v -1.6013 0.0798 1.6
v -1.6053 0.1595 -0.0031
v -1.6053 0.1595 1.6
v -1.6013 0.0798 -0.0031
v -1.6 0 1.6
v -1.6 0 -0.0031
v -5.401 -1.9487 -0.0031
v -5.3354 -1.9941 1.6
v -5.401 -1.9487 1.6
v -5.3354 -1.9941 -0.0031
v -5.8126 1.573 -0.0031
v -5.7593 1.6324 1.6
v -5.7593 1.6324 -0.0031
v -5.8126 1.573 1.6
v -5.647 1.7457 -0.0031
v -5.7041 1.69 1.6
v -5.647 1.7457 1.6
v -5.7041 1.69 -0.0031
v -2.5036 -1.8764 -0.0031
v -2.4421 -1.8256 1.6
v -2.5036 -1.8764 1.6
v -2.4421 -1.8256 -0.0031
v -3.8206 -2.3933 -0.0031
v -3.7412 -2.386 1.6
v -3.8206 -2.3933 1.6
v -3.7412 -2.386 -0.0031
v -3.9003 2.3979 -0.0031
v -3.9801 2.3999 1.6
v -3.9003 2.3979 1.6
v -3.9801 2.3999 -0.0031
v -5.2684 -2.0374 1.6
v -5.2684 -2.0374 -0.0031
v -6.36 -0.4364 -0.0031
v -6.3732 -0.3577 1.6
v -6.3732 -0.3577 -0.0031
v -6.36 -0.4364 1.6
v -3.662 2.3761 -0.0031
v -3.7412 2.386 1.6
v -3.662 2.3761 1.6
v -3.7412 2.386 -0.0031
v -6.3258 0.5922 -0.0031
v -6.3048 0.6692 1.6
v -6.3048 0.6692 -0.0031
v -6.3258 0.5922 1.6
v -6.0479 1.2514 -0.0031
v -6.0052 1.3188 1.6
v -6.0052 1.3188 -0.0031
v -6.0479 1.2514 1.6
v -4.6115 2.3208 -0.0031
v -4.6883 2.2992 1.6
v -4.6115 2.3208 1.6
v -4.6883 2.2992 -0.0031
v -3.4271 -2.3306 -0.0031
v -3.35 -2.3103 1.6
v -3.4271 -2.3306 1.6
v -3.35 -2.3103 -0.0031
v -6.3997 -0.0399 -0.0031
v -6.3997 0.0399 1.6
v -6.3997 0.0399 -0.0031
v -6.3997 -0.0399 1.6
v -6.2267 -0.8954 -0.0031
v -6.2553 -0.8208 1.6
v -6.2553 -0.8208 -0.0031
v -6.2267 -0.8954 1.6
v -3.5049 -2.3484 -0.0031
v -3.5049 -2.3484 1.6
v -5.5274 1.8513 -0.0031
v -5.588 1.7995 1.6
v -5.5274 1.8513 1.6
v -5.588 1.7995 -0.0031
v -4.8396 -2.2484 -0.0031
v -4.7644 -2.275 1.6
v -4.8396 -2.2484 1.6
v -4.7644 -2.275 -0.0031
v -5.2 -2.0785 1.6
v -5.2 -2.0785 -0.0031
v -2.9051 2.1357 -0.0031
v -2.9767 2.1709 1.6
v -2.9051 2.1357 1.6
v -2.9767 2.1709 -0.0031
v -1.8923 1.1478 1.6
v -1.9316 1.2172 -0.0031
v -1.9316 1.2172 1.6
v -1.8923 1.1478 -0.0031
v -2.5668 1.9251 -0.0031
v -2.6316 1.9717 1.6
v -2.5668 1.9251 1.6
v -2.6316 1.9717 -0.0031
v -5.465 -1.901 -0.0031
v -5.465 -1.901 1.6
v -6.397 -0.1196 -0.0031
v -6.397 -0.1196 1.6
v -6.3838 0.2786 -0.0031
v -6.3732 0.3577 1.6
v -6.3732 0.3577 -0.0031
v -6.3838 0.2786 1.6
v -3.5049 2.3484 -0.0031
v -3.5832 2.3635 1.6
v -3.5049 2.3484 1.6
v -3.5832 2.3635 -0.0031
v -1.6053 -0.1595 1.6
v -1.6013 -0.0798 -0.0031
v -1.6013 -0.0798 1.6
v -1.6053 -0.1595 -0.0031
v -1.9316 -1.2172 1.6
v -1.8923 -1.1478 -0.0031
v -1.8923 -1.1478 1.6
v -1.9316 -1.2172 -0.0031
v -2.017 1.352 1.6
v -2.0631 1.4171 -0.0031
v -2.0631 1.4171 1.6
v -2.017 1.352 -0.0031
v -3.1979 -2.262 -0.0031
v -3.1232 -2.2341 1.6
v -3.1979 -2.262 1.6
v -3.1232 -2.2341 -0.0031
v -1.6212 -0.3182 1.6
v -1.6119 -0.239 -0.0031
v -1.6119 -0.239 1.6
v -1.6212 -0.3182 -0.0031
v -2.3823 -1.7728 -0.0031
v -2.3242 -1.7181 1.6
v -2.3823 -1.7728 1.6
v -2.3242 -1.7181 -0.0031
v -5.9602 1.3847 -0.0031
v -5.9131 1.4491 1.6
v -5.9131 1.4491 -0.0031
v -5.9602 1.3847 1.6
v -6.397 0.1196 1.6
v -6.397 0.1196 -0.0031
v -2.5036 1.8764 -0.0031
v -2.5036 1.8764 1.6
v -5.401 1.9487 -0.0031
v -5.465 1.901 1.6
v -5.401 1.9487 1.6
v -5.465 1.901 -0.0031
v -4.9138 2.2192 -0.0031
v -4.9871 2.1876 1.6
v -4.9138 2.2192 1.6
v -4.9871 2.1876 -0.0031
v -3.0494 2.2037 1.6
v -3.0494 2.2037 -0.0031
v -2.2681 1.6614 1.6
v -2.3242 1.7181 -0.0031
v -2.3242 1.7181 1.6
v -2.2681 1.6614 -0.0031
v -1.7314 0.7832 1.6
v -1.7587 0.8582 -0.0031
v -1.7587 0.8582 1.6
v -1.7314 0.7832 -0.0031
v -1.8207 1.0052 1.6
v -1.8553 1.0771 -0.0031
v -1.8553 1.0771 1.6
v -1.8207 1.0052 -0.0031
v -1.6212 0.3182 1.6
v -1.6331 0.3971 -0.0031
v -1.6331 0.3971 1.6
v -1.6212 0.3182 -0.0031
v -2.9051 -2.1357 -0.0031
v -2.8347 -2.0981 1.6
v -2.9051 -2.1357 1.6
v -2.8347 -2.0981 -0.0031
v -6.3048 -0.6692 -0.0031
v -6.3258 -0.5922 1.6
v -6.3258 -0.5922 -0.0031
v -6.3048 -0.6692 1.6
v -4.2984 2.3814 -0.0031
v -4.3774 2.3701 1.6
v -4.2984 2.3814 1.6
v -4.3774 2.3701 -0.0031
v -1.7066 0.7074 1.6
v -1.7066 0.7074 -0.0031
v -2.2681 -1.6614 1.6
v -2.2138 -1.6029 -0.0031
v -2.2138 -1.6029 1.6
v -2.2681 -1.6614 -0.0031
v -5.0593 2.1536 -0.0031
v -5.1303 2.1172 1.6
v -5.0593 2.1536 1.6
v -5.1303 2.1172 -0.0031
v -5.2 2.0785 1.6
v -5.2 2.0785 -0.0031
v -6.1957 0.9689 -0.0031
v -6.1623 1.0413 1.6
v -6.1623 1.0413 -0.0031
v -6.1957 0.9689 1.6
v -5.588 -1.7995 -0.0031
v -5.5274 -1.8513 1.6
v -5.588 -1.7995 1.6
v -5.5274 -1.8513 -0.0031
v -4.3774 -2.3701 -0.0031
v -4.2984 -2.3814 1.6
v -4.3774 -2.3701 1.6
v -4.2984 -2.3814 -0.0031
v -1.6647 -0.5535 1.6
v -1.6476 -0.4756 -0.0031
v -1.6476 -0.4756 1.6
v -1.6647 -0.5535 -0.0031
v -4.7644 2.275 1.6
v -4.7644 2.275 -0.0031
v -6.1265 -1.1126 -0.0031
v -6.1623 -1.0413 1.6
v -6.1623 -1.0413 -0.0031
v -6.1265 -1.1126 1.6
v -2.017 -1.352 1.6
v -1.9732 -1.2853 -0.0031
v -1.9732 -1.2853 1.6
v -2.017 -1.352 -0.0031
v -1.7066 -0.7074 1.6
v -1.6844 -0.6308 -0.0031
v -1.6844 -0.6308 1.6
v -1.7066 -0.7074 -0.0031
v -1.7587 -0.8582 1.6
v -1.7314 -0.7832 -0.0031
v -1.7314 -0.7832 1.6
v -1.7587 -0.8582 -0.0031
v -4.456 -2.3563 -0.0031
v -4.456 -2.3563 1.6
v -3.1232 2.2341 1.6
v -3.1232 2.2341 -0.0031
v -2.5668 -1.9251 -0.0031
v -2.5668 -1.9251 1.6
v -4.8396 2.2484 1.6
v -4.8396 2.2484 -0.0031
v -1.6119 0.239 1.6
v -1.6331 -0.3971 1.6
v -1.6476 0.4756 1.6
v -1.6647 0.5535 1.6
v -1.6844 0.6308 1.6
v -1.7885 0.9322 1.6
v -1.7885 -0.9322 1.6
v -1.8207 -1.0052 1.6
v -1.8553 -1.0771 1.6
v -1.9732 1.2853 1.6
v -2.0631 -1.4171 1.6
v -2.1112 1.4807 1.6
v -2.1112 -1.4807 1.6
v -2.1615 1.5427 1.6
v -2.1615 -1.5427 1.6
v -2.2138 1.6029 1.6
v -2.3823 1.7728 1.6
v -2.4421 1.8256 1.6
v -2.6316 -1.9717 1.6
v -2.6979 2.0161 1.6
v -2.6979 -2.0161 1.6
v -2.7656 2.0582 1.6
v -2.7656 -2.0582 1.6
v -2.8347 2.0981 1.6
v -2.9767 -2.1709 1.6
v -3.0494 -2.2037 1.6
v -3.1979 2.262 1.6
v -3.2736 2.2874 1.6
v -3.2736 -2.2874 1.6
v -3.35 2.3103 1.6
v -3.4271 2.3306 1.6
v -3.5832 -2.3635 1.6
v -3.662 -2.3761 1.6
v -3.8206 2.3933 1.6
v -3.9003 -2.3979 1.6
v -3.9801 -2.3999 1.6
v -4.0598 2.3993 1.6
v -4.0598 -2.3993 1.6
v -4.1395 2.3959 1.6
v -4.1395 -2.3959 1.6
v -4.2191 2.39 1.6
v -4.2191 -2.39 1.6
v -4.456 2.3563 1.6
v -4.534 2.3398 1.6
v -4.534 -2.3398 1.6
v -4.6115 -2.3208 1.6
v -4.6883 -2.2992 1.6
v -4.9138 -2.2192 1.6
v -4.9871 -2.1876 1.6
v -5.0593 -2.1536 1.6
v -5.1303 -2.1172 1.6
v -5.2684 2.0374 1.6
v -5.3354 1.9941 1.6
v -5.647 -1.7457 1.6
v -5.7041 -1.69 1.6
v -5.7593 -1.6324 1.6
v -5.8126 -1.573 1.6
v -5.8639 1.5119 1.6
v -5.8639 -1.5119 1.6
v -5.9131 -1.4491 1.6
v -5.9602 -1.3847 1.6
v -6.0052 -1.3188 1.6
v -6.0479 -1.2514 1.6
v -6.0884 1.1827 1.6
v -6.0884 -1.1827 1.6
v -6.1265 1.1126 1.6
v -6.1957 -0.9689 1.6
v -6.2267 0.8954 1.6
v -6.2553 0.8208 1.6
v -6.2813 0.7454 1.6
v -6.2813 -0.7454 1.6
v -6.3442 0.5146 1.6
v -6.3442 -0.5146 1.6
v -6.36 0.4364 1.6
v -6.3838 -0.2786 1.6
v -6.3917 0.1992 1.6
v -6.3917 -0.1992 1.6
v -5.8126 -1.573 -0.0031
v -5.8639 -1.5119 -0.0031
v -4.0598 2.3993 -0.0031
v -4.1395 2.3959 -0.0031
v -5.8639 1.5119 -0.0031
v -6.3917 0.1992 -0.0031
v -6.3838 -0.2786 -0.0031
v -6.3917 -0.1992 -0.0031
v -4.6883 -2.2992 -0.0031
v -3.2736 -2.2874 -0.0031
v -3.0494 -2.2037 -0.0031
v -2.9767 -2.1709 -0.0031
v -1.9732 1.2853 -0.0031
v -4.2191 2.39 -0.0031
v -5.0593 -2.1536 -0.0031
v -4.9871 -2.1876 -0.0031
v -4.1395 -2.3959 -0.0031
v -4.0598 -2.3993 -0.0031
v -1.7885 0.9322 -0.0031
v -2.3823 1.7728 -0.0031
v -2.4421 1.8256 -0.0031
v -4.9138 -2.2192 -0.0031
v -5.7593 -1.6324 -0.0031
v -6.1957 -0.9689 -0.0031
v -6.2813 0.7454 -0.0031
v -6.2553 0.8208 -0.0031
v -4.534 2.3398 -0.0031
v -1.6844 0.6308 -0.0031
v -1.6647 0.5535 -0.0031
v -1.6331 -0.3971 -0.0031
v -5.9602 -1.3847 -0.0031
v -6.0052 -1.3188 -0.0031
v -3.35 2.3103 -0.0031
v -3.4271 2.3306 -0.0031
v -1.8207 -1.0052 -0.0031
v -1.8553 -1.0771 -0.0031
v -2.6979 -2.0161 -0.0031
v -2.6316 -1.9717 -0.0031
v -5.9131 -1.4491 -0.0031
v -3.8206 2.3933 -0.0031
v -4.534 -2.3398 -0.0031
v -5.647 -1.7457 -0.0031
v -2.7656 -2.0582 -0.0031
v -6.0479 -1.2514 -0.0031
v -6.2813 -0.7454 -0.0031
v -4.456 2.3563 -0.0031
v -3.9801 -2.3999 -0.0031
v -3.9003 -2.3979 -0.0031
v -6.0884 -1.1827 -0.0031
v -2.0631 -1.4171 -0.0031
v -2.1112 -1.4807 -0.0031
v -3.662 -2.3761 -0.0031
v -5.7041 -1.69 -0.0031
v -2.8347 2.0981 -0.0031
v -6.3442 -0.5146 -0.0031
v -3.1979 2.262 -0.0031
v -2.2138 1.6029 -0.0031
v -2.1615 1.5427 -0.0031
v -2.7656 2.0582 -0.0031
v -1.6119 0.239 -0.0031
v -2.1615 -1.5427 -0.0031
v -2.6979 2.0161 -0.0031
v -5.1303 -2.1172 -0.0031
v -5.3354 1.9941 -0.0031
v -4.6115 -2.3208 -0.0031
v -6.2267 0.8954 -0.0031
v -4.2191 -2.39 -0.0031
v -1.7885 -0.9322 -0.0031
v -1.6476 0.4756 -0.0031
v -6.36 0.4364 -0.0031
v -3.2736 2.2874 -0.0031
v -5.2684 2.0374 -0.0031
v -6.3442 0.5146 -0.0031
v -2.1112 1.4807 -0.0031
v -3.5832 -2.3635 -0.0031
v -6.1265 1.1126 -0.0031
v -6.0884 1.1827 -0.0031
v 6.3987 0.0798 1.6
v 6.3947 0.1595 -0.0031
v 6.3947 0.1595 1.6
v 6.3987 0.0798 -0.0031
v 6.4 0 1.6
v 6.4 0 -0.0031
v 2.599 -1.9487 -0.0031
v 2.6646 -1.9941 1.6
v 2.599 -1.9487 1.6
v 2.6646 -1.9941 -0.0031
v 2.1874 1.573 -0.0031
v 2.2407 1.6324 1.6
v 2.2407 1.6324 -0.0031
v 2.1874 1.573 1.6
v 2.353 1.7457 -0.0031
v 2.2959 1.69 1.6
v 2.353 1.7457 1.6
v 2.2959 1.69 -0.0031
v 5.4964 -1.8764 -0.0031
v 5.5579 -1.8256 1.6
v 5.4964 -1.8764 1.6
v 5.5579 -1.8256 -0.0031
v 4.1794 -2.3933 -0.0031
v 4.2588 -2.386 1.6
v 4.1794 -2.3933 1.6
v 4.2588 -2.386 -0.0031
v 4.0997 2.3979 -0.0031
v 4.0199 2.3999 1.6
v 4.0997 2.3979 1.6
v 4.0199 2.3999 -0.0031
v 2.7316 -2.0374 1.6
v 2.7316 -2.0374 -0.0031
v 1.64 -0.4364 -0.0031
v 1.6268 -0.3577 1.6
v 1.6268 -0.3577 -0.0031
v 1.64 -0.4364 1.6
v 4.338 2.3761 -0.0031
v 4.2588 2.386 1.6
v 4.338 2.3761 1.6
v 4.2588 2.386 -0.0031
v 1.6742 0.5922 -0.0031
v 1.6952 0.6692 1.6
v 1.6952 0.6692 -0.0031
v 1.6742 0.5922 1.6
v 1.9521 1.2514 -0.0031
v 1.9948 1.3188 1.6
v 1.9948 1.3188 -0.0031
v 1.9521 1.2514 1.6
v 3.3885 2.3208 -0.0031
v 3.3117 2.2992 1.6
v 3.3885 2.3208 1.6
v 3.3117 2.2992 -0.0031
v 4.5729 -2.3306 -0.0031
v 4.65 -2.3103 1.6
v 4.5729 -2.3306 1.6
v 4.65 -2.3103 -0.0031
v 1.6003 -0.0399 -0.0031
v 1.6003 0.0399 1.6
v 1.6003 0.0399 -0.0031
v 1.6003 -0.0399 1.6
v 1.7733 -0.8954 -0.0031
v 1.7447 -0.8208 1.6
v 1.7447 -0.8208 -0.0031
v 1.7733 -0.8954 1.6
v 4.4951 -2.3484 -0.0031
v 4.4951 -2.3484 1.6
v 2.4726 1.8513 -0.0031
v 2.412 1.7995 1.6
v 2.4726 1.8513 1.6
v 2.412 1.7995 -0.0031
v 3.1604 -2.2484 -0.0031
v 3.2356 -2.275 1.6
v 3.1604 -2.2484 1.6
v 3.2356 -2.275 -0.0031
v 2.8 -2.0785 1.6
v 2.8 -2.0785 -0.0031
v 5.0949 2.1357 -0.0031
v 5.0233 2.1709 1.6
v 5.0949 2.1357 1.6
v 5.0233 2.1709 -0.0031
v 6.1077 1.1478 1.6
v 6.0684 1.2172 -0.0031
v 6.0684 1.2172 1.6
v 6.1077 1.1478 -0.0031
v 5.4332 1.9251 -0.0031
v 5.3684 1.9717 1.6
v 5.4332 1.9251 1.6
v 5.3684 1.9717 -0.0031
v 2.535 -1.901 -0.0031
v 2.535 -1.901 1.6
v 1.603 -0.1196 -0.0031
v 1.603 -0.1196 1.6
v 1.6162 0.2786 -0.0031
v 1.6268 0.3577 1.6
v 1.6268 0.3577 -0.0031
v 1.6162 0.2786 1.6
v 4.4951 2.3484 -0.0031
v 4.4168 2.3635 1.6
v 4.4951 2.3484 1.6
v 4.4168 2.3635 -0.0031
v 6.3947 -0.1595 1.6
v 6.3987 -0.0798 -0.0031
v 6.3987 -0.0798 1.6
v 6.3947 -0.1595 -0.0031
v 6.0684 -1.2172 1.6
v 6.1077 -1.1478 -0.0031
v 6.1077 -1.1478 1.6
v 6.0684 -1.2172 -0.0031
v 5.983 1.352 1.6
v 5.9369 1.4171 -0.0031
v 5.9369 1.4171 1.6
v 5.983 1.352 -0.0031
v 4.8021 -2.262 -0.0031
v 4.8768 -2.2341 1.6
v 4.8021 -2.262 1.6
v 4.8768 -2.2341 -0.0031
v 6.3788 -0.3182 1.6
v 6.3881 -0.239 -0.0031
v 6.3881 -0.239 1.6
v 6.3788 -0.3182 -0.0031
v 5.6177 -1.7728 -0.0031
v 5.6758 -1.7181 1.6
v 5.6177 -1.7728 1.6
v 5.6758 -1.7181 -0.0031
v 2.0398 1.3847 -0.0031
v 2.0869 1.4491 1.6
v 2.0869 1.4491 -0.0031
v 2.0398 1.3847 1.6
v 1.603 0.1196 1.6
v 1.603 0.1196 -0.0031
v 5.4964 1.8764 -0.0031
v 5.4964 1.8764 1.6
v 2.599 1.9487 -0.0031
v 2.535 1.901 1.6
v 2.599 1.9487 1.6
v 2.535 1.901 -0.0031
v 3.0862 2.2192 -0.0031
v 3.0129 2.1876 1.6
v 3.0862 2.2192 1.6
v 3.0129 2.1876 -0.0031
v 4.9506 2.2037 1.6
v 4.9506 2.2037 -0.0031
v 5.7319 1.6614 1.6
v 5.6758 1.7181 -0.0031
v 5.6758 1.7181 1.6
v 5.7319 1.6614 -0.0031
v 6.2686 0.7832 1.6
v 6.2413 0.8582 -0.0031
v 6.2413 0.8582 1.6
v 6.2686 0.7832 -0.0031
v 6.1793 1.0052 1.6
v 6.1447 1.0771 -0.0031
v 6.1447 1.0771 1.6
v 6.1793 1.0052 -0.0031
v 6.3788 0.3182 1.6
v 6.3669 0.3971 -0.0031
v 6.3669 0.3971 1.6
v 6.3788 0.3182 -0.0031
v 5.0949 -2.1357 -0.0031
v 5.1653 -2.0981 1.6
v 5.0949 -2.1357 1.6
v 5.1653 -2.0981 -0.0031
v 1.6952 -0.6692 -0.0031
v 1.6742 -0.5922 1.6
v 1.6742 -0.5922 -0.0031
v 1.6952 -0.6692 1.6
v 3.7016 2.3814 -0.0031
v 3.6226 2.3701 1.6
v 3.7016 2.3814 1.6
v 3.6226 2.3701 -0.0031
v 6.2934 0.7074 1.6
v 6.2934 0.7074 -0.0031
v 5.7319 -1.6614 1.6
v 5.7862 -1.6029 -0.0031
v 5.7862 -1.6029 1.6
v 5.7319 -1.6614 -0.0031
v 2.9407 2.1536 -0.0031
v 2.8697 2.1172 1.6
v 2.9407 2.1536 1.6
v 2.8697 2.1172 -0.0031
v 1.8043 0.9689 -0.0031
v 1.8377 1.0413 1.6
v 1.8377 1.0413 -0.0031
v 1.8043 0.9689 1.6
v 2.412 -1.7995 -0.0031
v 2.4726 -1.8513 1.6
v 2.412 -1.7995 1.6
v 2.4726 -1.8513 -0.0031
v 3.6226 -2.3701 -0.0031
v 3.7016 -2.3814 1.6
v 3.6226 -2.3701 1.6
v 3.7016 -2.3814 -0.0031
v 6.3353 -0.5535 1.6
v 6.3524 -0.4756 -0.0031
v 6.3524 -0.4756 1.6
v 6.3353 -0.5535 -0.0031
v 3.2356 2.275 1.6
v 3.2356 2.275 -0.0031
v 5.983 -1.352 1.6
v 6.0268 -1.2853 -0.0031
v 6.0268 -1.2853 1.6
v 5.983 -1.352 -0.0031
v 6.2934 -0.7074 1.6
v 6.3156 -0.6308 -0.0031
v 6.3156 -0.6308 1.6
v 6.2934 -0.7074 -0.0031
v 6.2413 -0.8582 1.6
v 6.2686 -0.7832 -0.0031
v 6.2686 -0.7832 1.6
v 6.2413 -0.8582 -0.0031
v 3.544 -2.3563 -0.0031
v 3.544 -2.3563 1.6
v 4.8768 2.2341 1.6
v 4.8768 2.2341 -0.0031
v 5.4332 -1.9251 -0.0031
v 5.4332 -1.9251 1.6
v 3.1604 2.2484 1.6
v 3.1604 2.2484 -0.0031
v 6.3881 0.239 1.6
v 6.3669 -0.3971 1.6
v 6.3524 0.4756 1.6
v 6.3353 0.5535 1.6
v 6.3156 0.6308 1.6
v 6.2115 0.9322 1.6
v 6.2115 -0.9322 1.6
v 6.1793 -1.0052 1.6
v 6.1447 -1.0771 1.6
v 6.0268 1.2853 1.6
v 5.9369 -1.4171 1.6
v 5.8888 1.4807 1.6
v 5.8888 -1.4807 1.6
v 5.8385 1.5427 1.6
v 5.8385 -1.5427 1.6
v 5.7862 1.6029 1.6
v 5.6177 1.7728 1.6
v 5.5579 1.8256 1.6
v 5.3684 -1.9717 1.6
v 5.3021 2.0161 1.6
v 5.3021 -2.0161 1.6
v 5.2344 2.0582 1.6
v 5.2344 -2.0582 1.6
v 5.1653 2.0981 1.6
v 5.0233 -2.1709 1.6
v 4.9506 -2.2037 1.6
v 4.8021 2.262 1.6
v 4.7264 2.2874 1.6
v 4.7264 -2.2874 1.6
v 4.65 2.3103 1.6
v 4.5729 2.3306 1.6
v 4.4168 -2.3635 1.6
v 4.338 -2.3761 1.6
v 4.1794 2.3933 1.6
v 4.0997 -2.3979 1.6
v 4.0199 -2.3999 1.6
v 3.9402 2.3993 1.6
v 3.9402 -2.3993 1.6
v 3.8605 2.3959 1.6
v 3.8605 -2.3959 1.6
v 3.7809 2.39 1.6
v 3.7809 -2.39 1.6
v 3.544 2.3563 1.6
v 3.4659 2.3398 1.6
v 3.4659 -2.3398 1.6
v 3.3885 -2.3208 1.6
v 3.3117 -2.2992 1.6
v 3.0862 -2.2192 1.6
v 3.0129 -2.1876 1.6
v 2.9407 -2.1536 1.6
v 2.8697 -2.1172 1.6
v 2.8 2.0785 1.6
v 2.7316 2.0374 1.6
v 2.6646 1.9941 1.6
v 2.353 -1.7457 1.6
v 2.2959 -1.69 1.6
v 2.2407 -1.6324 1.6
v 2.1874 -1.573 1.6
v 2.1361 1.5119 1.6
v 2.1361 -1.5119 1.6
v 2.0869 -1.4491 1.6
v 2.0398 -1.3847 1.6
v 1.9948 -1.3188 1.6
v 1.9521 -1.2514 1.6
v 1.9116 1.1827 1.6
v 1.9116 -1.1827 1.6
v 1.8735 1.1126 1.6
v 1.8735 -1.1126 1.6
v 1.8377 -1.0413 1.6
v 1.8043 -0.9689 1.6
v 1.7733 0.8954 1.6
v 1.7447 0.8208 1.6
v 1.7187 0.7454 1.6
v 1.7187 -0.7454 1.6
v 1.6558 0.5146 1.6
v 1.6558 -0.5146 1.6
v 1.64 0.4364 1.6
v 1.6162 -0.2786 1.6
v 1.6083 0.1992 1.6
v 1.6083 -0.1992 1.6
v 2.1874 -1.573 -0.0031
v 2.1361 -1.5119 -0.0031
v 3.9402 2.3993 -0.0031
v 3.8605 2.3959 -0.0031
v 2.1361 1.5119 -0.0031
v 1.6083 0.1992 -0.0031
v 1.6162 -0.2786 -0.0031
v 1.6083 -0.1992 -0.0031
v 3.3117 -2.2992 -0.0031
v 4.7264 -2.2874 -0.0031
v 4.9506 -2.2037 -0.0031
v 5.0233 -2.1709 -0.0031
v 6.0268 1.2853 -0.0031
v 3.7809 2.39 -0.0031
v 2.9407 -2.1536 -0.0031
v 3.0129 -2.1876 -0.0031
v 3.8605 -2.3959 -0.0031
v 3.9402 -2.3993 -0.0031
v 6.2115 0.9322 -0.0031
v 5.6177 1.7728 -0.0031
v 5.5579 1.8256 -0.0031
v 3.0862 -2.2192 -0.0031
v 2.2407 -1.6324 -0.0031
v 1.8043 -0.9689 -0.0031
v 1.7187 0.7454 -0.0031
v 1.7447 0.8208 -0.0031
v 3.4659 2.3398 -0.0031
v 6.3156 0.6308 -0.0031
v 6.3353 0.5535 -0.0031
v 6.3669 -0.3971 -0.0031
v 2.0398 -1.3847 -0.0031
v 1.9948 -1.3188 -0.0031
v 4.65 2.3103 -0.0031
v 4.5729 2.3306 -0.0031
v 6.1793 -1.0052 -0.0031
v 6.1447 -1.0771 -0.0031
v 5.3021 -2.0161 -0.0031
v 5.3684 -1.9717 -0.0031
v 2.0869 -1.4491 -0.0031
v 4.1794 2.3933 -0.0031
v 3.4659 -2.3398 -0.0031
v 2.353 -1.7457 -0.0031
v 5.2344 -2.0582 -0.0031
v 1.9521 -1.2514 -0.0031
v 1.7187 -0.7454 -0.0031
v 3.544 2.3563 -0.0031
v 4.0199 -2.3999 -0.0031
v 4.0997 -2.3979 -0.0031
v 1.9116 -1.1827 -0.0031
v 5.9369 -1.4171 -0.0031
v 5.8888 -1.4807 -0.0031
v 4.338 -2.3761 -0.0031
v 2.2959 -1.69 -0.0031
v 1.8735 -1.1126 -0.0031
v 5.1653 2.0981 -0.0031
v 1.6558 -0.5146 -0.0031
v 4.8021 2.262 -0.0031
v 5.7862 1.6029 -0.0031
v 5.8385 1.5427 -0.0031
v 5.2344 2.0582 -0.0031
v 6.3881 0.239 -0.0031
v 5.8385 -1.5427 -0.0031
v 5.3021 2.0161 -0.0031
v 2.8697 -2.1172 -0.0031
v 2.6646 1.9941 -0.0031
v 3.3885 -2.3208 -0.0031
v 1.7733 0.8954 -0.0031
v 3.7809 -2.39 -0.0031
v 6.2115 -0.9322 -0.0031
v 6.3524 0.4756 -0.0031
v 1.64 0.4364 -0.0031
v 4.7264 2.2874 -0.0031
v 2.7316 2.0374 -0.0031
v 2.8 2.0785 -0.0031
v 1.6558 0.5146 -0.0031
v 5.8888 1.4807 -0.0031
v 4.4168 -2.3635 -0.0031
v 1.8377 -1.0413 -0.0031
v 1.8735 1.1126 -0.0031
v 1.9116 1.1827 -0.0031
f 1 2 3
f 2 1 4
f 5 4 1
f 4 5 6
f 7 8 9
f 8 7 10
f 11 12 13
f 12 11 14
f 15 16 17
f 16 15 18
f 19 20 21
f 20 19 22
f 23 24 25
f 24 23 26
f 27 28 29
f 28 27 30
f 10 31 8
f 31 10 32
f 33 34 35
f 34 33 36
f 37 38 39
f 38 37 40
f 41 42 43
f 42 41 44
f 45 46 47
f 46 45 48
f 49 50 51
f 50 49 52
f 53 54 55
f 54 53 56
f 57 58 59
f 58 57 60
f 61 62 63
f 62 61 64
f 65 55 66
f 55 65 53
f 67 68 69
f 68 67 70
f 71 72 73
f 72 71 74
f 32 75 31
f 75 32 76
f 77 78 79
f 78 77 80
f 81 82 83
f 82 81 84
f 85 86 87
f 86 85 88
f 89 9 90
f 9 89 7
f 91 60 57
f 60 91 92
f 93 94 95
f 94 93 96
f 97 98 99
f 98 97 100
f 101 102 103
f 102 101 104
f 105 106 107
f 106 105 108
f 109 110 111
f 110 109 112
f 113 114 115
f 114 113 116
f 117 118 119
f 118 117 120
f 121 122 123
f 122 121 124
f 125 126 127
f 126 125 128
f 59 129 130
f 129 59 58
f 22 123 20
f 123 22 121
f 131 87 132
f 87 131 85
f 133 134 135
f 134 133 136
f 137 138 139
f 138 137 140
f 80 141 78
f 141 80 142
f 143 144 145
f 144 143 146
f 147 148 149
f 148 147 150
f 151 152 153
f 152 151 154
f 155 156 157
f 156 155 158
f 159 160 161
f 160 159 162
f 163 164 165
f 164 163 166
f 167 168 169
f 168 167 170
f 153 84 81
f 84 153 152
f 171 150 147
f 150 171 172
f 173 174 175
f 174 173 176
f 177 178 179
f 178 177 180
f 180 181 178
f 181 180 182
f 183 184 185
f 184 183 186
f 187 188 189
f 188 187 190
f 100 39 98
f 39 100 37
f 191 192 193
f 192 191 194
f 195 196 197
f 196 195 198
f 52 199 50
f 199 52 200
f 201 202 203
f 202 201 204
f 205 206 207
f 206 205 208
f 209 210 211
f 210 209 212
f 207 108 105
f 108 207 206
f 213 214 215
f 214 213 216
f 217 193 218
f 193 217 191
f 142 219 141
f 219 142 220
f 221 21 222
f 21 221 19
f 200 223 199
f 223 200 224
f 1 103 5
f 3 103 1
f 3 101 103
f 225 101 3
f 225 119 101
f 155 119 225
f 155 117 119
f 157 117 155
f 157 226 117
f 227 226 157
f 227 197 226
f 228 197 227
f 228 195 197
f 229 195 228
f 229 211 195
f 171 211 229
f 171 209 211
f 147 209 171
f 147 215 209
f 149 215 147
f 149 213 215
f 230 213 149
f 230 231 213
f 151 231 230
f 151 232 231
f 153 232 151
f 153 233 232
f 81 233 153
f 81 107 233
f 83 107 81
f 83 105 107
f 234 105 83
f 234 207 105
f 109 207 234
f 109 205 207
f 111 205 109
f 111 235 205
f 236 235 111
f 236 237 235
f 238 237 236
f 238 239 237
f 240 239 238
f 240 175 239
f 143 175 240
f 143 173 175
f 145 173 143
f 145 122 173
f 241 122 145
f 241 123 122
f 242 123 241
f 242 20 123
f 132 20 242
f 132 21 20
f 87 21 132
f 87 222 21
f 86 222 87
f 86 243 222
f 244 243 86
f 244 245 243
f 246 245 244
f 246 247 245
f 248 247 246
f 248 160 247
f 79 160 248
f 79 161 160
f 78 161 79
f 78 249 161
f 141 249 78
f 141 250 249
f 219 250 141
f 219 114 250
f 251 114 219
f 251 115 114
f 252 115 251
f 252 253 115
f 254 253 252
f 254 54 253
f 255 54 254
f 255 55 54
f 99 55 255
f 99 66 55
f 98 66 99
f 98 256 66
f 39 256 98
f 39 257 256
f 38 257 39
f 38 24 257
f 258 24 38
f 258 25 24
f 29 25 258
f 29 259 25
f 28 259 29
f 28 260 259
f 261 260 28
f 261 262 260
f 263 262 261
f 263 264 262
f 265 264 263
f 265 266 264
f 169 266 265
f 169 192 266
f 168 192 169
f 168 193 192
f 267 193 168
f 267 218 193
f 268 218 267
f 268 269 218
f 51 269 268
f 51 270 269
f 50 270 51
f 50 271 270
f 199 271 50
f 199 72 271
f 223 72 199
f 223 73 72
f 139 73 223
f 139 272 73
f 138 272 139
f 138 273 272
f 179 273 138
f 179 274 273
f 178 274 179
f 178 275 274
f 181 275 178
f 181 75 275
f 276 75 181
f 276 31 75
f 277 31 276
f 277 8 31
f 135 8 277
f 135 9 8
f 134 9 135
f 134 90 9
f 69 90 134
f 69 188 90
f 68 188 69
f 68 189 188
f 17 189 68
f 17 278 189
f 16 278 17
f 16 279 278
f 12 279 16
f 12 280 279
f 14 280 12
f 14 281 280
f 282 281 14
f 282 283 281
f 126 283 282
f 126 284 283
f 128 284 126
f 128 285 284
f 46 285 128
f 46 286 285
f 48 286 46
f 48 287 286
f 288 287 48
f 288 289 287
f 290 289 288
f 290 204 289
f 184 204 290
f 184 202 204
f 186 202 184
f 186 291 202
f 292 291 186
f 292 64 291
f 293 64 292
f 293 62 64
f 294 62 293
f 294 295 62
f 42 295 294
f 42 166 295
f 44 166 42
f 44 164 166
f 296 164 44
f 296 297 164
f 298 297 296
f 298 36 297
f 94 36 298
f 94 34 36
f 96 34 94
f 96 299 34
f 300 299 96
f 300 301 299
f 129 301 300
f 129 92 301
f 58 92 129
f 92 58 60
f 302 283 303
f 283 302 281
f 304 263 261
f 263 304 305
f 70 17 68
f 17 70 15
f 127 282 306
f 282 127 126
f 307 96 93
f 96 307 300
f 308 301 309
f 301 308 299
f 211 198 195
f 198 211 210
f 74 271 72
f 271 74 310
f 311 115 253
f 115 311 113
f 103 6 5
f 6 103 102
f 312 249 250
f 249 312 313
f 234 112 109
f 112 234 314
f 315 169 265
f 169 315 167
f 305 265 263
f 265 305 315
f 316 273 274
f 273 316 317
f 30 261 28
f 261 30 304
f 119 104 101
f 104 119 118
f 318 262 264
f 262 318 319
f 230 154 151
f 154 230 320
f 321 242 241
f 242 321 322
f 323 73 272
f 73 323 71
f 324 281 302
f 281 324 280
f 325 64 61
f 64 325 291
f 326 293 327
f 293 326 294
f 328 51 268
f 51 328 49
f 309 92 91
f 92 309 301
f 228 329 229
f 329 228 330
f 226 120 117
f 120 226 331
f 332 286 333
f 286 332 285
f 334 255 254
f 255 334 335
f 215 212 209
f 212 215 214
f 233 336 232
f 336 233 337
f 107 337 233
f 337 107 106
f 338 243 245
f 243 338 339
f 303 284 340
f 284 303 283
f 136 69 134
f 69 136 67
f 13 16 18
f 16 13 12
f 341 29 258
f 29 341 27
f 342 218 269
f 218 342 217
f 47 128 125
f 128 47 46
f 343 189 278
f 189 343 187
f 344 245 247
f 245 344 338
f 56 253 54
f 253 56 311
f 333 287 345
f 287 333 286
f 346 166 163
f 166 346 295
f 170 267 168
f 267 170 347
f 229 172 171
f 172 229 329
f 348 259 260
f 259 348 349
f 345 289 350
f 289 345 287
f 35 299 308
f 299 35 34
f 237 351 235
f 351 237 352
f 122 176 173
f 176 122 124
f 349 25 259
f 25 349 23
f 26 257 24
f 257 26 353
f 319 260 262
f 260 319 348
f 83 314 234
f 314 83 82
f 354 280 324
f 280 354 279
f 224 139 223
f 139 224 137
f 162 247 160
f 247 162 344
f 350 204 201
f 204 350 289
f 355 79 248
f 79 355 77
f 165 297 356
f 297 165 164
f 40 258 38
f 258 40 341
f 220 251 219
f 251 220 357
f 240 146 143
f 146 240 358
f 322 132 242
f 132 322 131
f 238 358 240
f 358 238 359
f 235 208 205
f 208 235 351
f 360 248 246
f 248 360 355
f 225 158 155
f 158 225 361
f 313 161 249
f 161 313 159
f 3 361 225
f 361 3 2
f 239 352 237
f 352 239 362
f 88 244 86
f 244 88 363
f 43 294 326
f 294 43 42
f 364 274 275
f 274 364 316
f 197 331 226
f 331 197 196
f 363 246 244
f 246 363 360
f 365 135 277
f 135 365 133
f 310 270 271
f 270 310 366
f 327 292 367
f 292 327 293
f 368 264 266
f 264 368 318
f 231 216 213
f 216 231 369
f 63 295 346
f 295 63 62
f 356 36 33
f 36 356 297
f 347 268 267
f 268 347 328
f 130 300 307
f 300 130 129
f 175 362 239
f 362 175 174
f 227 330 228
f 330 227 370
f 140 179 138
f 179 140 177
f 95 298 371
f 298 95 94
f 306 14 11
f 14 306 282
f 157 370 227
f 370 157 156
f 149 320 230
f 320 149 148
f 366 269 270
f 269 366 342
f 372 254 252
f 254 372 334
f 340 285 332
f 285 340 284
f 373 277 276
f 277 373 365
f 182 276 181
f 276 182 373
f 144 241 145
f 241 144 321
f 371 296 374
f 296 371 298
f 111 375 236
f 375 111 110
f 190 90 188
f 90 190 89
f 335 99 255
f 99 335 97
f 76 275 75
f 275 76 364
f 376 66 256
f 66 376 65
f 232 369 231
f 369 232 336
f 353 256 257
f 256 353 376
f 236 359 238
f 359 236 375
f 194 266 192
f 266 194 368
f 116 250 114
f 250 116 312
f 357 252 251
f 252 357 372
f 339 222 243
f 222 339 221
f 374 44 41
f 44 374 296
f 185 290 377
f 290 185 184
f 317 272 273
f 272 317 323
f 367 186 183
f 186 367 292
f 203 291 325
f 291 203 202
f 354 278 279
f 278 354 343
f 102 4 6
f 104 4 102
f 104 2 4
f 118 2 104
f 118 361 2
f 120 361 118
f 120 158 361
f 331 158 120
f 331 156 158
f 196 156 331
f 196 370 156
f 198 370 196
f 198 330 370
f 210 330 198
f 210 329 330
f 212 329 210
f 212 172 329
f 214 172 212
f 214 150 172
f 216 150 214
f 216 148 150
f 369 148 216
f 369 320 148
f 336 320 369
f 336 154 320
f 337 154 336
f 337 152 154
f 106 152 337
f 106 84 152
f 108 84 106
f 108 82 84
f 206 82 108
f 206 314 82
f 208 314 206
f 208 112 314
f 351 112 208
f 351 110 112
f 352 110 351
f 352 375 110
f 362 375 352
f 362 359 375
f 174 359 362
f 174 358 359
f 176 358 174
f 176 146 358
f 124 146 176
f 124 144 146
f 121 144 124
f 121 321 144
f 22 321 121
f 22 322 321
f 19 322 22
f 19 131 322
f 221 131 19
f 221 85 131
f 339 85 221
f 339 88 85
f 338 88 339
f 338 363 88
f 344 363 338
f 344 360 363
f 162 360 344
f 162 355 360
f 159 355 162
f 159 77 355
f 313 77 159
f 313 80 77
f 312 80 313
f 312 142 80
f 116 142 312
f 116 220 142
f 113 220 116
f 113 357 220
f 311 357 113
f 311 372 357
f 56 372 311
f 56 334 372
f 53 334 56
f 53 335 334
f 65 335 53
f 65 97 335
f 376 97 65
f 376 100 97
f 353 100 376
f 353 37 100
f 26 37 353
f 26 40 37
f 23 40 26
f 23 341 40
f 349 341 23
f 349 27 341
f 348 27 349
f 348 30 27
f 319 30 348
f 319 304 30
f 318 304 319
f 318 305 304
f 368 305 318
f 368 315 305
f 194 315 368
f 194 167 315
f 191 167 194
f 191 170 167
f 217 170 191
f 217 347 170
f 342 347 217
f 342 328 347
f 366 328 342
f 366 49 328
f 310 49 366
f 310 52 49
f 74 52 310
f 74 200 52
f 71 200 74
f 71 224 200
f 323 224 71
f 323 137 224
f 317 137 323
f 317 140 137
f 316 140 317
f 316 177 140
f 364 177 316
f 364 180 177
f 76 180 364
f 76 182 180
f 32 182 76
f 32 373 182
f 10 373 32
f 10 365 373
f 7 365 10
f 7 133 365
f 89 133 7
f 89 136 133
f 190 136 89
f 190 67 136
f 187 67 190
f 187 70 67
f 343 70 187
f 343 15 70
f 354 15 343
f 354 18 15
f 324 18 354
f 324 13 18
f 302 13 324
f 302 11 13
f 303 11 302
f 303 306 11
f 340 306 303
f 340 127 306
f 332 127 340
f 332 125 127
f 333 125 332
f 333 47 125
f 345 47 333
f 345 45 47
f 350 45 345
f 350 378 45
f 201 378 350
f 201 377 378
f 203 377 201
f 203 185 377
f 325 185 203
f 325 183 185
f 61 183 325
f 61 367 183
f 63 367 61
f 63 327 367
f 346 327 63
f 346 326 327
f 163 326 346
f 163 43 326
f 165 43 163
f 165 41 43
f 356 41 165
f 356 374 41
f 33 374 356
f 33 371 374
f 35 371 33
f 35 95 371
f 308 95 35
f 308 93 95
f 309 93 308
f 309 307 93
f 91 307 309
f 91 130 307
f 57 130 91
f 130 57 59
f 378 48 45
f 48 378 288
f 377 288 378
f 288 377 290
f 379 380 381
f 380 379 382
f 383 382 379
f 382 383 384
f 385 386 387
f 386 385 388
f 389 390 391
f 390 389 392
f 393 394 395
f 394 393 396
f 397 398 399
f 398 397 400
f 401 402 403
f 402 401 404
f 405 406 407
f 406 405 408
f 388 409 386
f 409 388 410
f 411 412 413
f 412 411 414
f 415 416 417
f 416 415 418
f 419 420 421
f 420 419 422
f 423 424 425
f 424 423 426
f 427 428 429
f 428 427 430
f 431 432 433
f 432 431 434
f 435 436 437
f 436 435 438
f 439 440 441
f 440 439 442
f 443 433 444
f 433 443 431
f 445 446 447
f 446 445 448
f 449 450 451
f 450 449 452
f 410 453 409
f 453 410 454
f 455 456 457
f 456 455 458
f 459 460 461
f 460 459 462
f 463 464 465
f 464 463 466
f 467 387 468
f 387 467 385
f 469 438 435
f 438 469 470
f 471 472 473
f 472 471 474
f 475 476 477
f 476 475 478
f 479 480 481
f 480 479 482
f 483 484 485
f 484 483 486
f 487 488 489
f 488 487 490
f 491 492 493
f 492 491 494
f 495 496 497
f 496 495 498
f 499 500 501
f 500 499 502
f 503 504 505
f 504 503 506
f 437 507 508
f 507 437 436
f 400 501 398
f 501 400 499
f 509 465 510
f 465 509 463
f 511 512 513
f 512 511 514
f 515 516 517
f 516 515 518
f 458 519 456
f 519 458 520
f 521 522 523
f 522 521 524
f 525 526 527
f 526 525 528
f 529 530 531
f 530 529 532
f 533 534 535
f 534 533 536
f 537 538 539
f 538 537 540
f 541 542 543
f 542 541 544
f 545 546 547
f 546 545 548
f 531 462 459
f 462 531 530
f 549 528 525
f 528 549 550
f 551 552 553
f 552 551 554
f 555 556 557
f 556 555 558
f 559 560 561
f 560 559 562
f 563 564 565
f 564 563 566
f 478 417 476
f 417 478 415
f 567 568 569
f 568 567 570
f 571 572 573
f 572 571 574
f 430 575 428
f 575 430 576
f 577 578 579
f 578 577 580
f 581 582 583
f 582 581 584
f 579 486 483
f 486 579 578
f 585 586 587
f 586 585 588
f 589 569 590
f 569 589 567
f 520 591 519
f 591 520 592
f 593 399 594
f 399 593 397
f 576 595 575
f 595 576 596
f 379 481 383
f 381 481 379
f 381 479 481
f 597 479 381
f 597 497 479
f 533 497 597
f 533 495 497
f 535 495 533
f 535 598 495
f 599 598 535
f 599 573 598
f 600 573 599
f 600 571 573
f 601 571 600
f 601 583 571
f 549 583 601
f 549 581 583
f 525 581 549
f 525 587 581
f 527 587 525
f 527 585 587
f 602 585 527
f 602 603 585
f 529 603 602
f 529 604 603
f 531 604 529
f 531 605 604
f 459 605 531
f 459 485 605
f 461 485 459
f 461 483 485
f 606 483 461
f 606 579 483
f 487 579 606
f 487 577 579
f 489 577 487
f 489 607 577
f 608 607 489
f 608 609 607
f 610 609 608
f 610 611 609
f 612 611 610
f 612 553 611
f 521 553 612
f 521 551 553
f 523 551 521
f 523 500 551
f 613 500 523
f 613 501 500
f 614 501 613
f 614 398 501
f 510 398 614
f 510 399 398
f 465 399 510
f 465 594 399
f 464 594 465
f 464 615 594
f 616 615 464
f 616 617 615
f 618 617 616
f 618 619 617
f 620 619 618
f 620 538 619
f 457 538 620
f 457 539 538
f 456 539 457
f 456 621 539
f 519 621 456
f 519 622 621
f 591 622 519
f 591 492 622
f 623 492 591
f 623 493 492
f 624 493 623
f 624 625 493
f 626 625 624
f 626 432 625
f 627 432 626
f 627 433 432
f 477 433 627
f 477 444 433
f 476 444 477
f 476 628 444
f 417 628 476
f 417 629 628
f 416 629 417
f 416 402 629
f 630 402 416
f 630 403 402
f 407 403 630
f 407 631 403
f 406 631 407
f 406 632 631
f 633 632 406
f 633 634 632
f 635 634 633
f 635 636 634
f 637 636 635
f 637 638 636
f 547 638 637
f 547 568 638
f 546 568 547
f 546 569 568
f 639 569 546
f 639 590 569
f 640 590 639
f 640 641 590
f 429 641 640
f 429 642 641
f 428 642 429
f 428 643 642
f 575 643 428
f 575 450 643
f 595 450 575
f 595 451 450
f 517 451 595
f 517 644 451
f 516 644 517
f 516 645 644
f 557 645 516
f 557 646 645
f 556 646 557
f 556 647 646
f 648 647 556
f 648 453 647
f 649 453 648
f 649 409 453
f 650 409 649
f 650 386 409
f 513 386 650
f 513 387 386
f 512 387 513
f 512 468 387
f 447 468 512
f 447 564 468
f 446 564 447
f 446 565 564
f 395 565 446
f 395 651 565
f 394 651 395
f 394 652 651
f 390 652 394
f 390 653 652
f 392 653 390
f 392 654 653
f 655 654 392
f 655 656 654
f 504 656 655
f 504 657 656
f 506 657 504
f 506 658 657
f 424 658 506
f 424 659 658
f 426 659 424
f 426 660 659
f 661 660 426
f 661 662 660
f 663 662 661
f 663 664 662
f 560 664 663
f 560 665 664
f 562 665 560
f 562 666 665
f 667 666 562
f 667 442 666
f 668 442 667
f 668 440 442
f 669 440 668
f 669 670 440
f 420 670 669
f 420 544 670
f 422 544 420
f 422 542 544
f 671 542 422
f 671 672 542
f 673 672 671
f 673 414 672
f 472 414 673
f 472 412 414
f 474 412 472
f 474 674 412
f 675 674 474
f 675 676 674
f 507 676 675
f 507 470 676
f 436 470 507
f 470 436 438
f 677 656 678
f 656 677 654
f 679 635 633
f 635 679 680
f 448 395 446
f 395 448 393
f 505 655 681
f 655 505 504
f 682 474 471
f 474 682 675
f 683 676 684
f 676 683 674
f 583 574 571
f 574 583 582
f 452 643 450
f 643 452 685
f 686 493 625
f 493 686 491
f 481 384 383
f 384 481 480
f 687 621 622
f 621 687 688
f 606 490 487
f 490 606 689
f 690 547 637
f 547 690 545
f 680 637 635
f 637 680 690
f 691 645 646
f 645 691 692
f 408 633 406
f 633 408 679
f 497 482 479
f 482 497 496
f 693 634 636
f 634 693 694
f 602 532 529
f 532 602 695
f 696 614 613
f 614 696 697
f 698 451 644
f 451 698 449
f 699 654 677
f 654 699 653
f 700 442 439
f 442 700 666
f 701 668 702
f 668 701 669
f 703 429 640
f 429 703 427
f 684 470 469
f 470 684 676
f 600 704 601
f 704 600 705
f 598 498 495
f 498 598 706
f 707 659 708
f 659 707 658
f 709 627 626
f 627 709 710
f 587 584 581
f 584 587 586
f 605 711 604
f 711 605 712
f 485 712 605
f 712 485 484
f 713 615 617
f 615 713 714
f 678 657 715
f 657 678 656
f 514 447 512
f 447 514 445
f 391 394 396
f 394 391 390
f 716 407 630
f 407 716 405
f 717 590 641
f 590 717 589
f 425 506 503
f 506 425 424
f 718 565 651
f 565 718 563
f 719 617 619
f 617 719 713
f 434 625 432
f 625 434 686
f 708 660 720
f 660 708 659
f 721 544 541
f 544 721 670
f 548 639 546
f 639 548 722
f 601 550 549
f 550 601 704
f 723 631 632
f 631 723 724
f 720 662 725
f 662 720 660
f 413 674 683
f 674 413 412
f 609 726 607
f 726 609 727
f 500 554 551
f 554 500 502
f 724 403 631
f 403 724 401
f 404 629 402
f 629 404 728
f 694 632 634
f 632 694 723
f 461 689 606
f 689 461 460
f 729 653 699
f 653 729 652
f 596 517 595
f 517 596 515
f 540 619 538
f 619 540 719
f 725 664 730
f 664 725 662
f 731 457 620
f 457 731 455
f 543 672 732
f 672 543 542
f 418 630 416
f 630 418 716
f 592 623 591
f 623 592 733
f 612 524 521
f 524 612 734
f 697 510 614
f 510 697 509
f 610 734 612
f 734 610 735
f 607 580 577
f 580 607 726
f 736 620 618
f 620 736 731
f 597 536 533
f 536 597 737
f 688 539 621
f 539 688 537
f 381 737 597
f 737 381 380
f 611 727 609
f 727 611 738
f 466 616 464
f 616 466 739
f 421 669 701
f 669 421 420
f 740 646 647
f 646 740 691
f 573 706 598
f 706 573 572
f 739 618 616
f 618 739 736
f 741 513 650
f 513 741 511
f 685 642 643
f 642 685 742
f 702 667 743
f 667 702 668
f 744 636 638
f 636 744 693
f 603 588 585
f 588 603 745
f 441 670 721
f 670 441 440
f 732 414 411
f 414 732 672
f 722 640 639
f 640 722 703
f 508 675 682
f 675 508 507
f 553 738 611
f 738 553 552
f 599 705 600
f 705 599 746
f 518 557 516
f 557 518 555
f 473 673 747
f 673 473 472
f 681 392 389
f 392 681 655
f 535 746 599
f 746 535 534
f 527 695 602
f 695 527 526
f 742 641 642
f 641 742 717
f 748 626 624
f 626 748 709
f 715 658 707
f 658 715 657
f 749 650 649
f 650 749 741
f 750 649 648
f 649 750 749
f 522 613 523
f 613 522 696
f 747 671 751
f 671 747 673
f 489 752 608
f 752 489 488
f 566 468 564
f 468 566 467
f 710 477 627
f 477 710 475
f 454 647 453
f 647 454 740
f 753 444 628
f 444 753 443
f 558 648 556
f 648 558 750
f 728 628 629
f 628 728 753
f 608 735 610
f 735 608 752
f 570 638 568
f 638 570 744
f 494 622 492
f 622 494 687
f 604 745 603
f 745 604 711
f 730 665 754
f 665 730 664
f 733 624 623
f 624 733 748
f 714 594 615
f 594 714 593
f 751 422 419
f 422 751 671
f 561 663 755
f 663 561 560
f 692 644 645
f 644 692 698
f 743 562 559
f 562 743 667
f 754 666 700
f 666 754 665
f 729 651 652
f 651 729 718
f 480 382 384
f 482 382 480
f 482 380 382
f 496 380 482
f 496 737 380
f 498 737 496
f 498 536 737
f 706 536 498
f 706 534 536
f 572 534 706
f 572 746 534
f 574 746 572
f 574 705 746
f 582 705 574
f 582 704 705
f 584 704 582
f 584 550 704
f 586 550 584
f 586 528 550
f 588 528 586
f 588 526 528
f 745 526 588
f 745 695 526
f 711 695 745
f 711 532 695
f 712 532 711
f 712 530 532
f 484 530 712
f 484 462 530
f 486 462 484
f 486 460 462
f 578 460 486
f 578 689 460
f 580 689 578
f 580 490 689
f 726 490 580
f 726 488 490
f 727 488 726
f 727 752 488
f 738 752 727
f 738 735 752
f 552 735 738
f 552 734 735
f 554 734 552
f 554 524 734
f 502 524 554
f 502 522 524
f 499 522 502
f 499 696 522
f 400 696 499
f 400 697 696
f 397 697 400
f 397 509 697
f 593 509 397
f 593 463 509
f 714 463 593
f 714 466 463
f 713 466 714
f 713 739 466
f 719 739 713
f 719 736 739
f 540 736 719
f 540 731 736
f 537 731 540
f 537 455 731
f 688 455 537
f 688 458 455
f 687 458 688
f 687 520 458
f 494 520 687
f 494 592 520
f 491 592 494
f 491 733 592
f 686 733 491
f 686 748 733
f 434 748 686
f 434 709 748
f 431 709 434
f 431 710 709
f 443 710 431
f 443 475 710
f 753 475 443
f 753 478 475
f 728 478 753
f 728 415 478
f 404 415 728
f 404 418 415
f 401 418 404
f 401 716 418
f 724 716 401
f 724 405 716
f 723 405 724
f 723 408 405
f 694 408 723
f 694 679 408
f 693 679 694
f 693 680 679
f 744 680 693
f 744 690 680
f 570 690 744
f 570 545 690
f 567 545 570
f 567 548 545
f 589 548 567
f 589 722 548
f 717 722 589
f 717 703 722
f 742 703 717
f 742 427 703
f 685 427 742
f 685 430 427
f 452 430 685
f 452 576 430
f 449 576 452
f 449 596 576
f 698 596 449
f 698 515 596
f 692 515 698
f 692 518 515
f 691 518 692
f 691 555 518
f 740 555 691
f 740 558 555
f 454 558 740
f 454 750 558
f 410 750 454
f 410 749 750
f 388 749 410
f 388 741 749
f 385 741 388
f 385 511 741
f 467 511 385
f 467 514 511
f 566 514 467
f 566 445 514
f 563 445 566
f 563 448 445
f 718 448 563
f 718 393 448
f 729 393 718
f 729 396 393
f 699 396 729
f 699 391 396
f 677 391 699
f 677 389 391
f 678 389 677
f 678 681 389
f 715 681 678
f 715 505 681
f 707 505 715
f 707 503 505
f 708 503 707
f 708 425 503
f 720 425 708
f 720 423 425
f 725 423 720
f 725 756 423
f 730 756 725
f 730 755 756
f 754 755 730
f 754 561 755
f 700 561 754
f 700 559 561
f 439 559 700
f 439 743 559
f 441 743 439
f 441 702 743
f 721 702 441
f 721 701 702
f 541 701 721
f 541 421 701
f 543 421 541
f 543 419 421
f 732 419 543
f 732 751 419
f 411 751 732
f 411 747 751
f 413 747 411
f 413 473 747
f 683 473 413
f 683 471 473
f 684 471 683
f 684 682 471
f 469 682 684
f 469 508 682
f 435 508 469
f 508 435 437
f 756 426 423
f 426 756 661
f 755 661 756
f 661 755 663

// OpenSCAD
use <../lib.scad>
use <../p/4-4edge.scad>
use <../p/box2-5.scad>
use <../p/box3u4a.scad>
use <../p/box3u6.scad>
use <../p/box5.scad>
use <../p/connect.scad>
use <../p/rect1.scad>
use <../p/stug-2x1.scad>
$fa=1; $fs=0.2;
function ldraw_lib__44865(realsolid=false) = [
// 0 Brick  1 x  2 with Pin with Bottom Stud Holder
// 0 Name: 44865.dat
// 0 Author: Bertrand Lequy [Berth]
// 0 !LDRAW_ORG Part UPDATE 2022-01
// 0 !LICENSE Licensed under CC BY 2.0 and CC BY 4.0 : see CAreadme.txt
// 
// 0 BFC CERTIFY CCW
  [0,"BFC","CERTIFY"],
  [0,"BFC","CCW"],
// 
// 0 !KEYWORDS connector, peg, Technic
// 
// 0 !HISTORY 2022-01-14 [PTadmin] Official Update 2022-01
// 
// 
// 1 16 5 4 -5.5 0 0 1.5 0 20 0 -0.5 0 0 box3u6.dat
  [1,16,5,4,-5.5,0,0,1.5,0,20,0,-0.5,0,0, ldraw_lib__box3u6(realsolid)],
// 1 16 5 14 -5 0 -0.75 0.75 10 0 0 0 0.75 0.75 box2-5.dat
  [1,16,5,14,-5,0,-0.75,0.75,10,0,0,0,0.75,0.75, ldraw_lib__box2_5(realsolid)],
// 1 16 0 14 -6 0 0 -3.5 10 0 0 0 -1 0 rect1.dat
  [1,16,0,14,-6,0,0,-3.5,10,0,0,0,-1,0, ldraw_lib__rect1(realsolid)],
// 1 16 -5 4 -5.5 0 0 1.5 0 20 0 -0.5 0 0 box3u6.dat
  [1,16,-5,4,-5.5,0,0,1.5,0,20,0,-0.5,0,0, ldraw_lib__box3u6(realsolid)],
// 1 16 -5 14 -5 0 -0.75 0.75 10 0 0 0 0.75 0.75 box2-5.dat
  [1,16,-5,14,-5,0,-0.75,0.75,10,0,0,0,0.75,0.75, ldraw_lib__box2_5(realsolid)],
// 1 16 -5 4 5.5 0 0 -1.5 0 20 0 0.5 0 0 box3u6.dat
  [1,16,-5,4,5.5,0,0,-1.5,0,20,0,0.5,0,0, ldraw_lib__box3u6(realsolid)],
// 1 16 -5 14 5 0 0.75 -0.75 10 0 0 0 -0.75 -0.75 box2-5.dat
  [1,16,-5,14,5,0,0.75,-0.75,10,0,0,0,-0.75,-0.75, ldraw_lib__box2_5(realsolid)],
// 1 16 0 14 6 0 0 3.5 10 0 0 0 1 0 rect1.dat
  [1,16,0,14,6,0,0,3.5,10,0,0,0,1,0, ldraw_lib__rect1(realsolid)],
// 1 16 5 4 5.5 0 0 -1.5 0 20 0 0.5 0 0 box3u6.dat
  [1,16,5,4,5.5,0,0,-1.5,0,20,0,0.5,0,0, ldraw_lib__box3u6(realsolid)],
// 1 16 5 14 5 0 0.75 -0.75 10 0 0 0 -0.75 -0.75 box2-5.dat
  [1,16,5,14,5,0,0.75,-0.75,10,0,0,0,-0.75,-0.75, ldraw_lib__box2_5(realsolid)],
// 0 BFC INVERTNEXT
  [0,"BFC","INVERTNEXT"],
// 1 16 6.5 14 0 0 9.5 0 -10 0 0 0 0 6 box3u4a.dat
  [1,16,6.5,14,0,0,9.5,0,-10,0,0,0,0,6, ldraw_lib__box3u4a(realsolid)],
// 0 BFC INVERTNEXT
  [0,"BFC","INVERTNEXT"],
// 1 16 -6.5 14 0 0 -9.5 0 -10 0 0 0 0 -6 box3u4a.dat
  [1,16,-6.5,14,0,0,-9.5,0,-10,0,0,0,0,-6, ldraw_lib__box3u4a(realsolid)],
// 4 16 -16 4 6 16 4 6 16 4 -6 -16 4 -6
  [4,16,-16,4,6,16,4,6,16,4,-6,-16,4,-6],
// 2 24 -3.5 4 6 3.5 4 6
  [2,24,-3.5,4,6,3.5,4,6],
// 2 24 -3.5 4 -6 3.5 4 -6
  [2,24,-3.5,4,-6,3.5,4,-6],
// 
// 3 16 20 24 10 16 24 6 6.5 24 6
  [3,16,20,24,10,16,24,6,6.5,24,6],
// 3 16 20 24 10 6.5 24 6 3.5 24 6
  [3,16,20,24,10,6.5,24,6,3.5,24,6],
// 4 16 20 24 10 3.5 24 6 -3.5 24 6 -20 24 10
  [4,16,20,24,10,3.5,24,6,-3.5,24,6,-20,24,10],
// 3 16 -3.5 24 6 -6.5 24 6 -20 24 10
  [3,16,-3.5,24,6,-6.5,24,6,-20,24,10],
// 3 16 -6.5 24 6 -16 24 6 -20 24 10
  [3,16,-6.5,24,6,-16,24,6,-20,24,10],
// 4 16 -20 24 10 -16 24 6 -16 24 -6 -20 24 -10
  [4,16,-20,24,10,-16,24,6,-16,24,-6,-20,24,-10],
// 3 16 -20 24 -10 -16 24 -6 -6.5 24 -6
  [3,16,-20,24,-10,-16,24,-6,-6.5,24,-6],
// 3 16 -20 24 -10 -6.5 24 -6 -3.5 24 -6
  [3,16,-20,24,-10,-6.5,24,-6,-3.5,24,-6],
// 4 16 -20 24 -10 -3.5 24 -6 3.5 24 -6 20 24 -10
  [4,16,-20,24,-10,-3.5,24,-6,3.5,24,-6,20,24,-10],
// 3 16 3.5 24 -6 6.5 24 -6 20 24 -10
  [3,16,3.5,24,-6,6.5,24,-6,20,24,-10],
// 3 16 6.5 24 -6 16 24 -6 20 24 -10
  [3,16,6.5,24,-6,16,24,-6,20,24,-10],
// 4 16 20 24 -10 16 24 -6 16 24 6 20 24 10
  [4,16,20,24,-10,16,24,-6,16,24,6,20,24,10],
// 3 16 -6.5 24 -5 -5 24 -3.5 -3.5 24 -5
  [3,16,-6.5,24,-5,-5,24,-3.5,-3.5,24,-5],
// 3 16 -3.5 24 5 -5 24 3.5 -6.5 24 5
  [3,16,-3.5,24,5,-5,24,3.5,-6.5,24,5],
// 3 16 3.5 24 -5 5 24 -3.5 6.5 24 -5
  [3,16,3.5,24,-5,5,24,-3.5,6.5,24,-5],
// 3 16 6.5 24 5 5 24 3.5 3.5 24 5
  [3,16,6.5,24,5,5,24,3.5,3.5,24,5],
// 
// 1 16 0 24 0 20 0 0 0 -24 0 0 0 10 box5.dat
  [1,16,0,24,0,20,0,0,0,-24,0,0,0,10, ldraw_lib__box5(realsolid)],
// 1 16 0 0 0 0 0 -1 0 1 0 1 0 0 stug-2x1.dat
  [1,16,0,0,0,0,0,-1,0,1,0,1,0,0, ldraw_lib__stug_2x1(realsolid)],
// 1 16 0 10 -10 4 0 0 0 0 4 0 -1 0 4-4edge.dat
  [1,16,0,10,-10,4,0,0,0,0,4,0,-1,0, ldraw_lib__4_4edge(realsolid)],
// 1 16 0 10 -10 8 0 0 0 0 8 0 -1 0 4-4edge.dat
  [1,16,0,10,-10,8,0,0,0,0,8,0,-1,0, ldraw_lib__4_4edge(realsolid)],
// 1 16 0 10 -10 0 0 1 1 0 0 0 1 0 connect.dat
  [1,16,0,10,-10,0,0,1,1,0,0,0,1,0, ldraw_lib__connect(realsolid)],
];
module ldraw_lib__44865(step=0, col=false, unit=2/5, alt=false, line=0.2, solid=!$preview)
    makepoly(ldraw_lib__44865(solid), step=step, col=col, unit=unit, alt=alt, line=line, solid=solid);
ldraw_lib__44865(line=0.2);
